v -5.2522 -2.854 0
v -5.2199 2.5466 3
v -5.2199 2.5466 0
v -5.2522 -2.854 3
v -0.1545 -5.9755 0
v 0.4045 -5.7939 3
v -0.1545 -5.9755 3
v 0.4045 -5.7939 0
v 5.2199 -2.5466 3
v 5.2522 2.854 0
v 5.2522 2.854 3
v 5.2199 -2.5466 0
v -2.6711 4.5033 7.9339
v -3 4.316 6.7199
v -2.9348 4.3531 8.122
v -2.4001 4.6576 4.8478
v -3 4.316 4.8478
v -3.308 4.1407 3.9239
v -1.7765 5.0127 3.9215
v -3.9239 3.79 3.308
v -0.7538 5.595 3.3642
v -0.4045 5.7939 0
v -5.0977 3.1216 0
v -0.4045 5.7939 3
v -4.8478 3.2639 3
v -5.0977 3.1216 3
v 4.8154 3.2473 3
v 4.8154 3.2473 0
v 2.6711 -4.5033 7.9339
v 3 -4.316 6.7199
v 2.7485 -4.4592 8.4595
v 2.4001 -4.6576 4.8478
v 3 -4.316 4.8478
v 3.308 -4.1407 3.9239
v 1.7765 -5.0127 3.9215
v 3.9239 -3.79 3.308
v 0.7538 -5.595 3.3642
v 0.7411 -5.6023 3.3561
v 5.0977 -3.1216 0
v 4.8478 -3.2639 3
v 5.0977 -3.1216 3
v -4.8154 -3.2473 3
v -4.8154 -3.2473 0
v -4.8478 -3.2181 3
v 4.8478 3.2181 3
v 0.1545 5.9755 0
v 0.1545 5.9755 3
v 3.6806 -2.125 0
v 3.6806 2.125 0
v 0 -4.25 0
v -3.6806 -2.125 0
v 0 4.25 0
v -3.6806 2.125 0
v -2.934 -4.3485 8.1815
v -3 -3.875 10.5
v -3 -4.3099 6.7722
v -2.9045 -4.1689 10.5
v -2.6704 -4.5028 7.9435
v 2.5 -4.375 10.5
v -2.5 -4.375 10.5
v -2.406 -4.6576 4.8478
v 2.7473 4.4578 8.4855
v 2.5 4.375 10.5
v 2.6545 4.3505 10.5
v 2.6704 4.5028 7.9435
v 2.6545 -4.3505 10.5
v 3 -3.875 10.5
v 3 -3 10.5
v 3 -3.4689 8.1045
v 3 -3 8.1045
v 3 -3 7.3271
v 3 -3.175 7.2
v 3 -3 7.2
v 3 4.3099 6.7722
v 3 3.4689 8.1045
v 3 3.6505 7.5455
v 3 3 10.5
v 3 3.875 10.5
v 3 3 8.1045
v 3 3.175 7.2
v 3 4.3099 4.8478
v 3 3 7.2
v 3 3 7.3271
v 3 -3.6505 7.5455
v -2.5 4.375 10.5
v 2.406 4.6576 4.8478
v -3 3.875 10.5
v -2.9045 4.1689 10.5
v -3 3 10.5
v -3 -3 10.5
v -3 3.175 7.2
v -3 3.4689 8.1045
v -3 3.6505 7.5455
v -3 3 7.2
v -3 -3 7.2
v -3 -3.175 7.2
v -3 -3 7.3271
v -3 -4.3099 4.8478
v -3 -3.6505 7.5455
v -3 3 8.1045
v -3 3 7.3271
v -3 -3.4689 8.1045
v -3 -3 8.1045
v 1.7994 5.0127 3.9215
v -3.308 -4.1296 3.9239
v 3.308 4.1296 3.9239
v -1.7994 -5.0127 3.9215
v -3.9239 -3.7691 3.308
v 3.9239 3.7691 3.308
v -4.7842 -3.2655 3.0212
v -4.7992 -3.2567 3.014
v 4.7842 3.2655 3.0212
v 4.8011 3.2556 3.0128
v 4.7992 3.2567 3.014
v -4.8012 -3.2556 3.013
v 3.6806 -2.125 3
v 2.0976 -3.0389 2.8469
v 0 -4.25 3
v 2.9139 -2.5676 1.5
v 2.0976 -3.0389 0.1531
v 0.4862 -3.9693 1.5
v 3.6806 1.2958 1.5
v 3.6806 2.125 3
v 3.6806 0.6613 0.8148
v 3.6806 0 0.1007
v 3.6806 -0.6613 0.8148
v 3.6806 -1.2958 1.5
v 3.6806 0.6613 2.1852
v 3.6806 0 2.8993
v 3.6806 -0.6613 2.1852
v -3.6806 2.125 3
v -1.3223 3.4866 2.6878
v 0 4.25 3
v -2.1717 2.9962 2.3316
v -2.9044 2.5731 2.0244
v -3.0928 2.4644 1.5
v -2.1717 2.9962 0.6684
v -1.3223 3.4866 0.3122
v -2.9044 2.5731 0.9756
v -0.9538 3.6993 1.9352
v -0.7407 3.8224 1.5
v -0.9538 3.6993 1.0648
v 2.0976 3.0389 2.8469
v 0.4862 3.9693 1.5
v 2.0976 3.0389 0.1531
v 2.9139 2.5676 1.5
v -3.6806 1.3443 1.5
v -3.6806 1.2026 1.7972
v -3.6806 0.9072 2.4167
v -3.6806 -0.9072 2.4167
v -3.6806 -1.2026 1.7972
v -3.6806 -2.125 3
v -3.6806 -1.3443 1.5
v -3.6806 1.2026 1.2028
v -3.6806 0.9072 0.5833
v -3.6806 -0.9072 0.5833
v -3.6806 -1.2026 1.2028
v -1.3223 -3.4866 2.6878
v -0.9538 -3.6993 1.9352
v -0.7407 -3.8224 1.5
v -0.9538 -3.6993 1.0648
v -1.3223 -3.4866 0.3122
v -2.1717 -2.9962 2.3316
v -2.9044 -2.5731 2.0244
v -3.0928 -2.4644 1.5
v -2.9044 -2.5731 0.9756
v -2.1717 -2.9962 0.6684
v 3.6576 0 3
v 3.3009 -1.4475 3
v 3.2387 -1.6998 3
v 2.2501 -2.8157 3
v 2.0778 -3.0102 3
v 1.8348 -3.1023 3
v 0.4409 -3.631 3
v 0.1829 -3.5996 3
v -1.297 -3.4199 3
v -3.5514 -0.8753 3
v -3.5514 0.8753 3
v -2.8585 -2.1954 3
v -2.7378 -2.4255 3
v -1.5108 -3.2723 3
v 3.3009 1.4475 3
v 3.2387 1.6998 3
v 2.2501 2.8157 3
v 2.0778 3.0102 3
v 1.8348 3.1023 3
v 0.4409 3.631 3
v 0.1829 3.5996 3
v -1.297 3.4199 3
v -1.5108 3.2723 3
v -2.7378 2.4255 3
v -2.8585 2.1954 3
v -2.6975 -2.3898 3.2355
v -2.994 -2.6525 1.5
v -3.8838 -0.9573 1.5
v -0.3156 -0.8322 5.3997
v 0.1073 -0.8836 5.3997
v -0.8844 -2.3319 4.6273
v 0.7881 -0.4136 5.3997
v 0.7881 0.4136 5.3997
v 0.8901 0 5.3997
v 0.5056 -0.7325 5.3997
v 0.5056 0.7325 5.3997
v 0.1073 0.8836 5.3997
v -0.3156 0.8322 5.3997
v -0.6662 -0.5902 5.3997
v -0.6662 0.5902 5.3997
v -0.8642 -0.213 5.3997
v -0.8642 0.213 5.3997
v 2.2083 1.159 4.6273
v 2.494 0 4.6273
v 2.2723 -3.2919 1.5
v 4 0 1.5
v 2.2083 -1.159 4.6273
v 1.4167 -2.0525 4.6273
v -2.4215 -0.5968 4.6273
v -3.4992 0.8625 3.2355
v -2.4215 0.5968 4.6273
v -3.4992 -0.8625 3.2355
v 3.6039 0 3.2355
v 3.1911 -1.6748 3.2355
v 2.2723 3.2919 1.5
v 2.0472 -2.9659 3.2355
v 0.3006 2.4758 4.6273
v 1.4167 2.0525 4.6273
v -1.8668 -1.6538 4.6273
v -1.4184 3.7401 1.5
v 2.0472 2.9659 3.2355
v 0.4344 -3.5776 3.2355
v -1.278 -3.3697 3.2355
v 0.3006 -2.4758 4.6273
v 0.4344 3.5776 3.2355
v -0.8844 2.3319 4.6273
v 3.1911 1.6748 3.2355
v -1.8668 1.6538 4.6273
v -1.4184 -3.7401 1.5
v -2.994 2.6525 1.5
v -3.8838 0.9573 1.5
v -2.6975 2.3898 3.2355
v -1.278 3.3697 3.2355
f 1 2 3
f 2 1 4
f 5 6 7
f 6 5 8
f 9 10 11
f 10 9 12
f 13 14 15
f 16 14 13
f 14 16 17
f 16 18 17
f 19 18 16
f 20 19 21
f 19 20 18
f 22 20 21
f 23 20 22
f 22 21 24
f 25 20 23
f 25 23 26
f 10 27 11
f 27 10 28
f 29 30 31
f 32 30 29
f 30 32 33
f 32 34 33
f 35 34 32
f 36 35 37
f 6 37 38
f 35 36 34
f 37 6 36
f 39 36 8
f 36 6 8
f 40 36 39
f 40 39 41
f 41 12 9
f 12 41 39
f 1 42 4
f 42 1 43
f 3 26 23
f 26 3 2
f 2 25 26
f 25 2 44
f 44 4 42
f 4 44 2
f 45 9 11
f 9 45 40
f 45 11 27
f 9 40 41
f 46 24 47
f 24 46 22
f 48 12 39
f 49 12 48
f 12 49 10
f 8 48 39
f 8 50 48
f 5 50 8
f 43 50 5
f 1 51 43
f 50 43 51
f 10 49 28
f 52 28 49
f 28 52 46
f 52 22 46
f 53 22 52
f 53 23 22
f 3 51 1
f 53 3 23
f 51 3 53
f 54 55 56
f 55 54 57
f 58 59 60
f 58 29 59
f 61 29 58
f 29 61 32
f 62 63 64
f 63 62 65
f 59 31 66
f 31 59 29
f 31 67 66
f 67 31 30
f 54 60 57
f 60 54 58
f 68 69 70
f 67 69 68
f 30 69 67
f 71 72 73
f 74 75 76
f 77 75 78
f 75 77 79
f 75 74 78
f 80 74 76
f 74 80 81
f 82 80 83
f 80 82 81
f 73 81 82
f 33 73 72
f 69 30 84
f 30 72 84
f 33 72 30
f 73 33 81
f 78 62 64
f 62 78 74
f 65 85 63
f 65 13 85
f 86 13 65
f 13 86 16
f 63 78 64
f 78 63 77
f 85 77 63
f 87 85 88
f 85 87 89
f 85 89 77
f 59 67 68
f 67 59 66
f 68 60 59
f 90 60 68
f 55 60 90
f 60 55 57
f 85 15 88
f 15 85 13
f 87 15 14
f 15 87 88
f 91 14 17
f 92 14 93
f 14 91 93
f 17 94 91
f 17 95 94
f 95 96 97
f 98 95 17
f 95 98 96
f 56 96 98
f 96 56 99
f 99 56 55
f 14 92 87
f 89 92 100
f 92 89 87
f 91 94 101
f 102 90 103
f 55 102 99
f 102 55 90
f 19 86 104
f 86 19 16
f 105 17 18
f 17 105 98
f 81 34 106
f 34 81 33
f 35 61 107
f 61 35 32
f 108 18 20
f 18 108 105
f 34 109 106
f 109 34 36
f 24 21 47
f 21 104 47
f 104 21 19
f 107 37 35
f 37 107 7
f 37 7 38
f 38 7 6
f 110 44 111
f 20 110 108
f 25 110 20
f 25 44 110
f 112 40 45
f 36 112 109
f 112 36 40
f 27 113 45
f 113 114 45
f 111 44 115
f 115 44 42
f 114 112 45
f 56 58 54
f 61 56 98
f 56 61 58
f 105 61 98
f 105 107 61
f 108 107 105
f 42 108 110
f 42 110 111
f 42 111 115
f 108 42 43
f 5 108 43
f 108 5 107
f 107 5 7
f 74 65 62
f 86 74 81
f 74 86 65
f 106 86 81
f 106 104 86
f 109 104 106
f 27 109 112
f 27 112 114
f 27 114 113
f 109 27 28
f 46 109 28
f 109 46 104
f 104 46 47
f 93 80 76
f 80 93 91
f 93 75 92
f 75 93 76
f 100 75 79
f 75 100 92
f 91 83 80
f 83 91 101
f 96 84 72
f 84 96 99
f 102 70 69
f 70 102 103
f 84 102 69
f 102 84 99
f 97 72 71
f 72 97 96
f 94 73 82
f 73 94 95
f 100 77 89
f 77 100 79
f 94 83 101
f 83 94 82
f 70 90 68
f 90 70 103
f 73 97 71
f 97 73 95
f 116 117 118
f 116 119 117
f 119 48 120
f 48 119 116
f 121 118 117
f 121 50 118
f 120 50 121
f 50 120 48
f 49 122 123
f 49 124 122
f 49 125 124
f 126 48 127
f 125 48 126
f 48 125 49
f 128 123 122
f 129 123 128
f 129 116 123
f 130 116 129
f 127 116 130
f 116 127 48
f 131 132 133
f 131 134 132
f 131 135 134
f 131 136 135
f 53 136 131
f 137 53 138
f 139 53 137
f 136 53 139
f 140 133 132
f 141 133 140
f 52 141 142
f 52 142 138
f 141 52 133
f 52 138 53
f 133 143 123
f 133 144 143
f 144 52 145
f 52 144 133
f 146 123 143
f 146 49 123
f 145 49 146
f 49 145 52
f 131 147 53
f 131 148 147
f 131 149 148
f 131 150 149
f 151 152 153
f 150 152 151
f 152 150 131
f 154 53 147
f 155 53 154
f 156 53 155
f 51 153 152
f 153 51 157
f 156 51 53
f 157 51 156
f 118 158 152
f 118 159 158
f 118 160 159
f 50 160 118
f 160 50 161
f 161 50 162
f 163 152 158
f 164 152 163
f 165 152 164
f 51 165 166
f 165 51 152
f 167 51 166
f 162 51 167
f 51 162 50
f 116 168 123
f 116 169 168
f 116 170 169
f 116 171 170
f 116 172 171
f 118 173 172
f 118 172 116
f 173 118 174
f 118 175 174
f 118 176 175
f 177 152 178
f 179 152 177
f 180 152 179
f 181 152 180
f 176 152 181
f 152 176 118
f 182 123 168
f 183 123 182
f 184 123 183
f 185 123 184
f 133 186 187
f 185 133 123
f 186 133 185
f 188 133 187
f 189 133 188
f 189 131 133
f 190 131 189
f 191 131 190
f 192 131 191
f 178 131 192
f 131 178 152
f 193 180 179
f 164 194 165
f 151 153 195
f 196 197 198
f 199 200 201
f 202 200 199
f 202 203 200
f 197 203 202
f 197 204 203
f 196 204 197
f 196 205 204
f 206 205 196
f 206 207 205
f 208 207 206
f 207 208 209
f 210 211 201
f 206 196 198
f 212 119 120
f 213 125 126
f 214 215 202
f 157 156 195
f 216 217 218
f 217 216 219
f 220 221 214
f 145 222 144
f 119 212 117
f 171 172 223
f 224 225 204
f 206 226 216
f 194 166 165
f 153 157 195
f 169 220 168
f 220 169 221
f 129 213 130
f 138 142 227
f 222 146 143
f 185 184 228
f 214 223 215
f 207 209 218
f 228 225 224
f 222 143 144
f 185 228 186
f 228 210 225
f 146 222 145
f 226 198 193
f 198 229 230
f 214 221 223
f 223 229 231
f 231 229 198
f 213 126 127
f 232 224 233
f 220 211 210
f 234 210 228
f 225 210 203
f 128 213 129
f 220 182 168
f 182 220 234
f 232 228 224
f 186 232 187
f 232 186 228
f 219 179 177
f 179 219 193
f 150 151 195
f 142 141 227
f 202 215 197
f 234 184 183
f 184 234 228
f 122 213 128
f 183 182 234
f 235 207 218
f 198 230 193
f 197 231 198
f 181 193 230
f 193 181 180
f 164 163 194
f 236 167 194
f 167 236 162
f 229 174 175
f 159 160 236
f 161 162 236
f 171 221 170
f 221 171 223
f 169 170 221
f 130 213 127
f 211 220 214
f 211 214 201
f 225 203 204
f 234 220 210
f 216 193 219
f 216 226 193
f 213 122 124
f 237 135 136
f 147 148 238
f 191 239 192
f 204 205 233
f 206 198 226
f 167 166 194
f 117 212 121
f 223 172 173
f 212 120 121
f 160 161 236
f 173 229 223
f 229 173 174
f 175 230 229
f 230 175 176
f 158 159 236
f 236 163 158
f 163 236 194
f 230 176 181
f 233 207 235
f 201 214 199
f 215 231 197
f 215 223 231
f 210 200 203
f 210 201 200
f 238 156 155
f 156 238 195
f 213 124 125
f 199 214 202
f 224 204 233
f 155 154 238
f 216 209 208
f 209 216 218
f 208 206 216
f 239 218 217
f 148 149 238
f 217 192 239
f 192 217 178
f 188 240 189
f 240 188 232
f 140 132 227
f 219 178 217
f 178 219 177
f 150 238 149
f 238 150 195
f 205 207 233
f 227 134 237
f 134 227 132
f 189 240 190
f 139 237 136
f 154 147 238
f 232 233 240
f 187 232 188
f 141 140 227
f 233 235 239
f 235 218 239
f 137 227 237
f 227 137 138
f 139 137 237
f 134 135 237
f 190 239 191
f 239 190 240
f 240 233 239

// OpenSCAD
// file: lib/screw.scad
//////////////////////////////////////////////////////////////////////
// Screws, Bolts, and Nuts.
//////////////////////////////////////////////////////////////////////

function get_metric_bolt_head_size(size) = lookup(size, [
		[ 4.0,  7.0],
		[ 5.0,  8.0],
		[ 6.0, 10.0],
		[ 7.0, 11.0],
		[ 8.0, 13.0],
		[10.0, 16.0],
		[12.0, 18.0],
		[14.0, 21.0],
		[16.0, 24.0],
		[18.0, 27.0],
		[20.0, 30.0]
	]);


function get_metric_nut_size(size) = lookup(size, [
		[ 2.0,  4.0],
		[ 2.5,  5.0],
		[ 3.0,  5.5],
		[ 4.0,  7.0],
		[ 5.0,  8.0],
		[ 6.0, 10.0],
		[ 7.0, 11.0],
		[ 8.0, 13.0],
		[10.0, 17.0],
		[12.0, 19.0],
		[14.0, 22.0],
		[16.0, 24.0],
		[18.0, 27.0],
		[20.0, 30.0],
	]);


function get_metric_nut_thickness(size) = lookup(size, [
		[ 2.0,  1.6],
		[ 2.5,  2.0],
		[ 3.0,  2.4],
		[ 4.0,  3.2],
		[ 5.0,  4.0],
		[ 6.0,  5.0],
		[ 7.0,  5.5],
		[ 8.0,  6.5],
		[10.0,  8.0],
		[12.0, 10.0],
		[14.0, 11.0],
		[16.0, 13.0],
		[18.0, 15.0],
		[20.0, 16.0]
	]);


function get_metric_corehole_size(size) = lookup(size, [
		[ 2.0,  1.60],
		[ 2.5,  2.05],
		[ 3.0,  2.50],
		[ 4.0,  3.30],
		[ 5.0,  4.20],
		[ 6.0,  5.00],
		[ 8.0,  6.80],
		[10.0,  8.50],
		[12.0, 10.20],
		[16.0, 14.00],
		[20.0, 17.50]
	]);

// Makes a simple threadless screw, useful for making screwholes.
//   screwsize = diameter of threaded part of screw.
//   screwlen = length of threaded part of screw.
//   headsize = diameter of the screw head.
//   headlen = length of the screw head.
// Example:
//   screw(screwsize=3,screwlen=10,headsize=6,headlen=3);
module screw(screwsize=3,screwlen=10,headsize=6,headlen=3,$fn=undef,tolerance=0)
{
	$fn = ($fn==undef)?max(8,floor(180/asin(2/screwsize)/2)*2):$fn;
	translate([0,0,-(screwlen)/2])
		cylinder(r=screwsize/2+tolerance/2, h=screwlen+0.05, center=true, $fn=$fn);
	translate([0,0,(headlen)/2])
		cylinder(r=headsize/2+tolerance/2, h=headlen, center=true, $fn=$fn*2);
}


// Makes an unthreaded model of a standard nut for a standard metric screw.
//   size = standard metric screw size in mm. (Default: 3)
//   hole = include an unthreaded hole in the nut.  (Default: true)
// Example:
//   metric_nut(size=8, hole=true);
//   metric_nut(size=3, hole=false);
module metric_nut(size=3, hole=true, $fn=undef, center=false, play=0, hPlay=0)
{
	$fn = ($fn==undef)?max(8,floor(180/asin(2/size)/2)*2):$fn;
	radius = get_metric_nut_size(size)/2/cos(30);
	thick = get_metric_nut_thickness(size);
	offset = (center == true)? 0 : (thick+hPlay)/2;
	translate([0,0,offset]) difference() {
		cylinder(r=radius+play, h=thick+hPlay, center=true, $fn=6);
		if (hole == true)
			cylinder(r=size/2, h=thick+hPlay+0.5, center=true, $fn=$fn);
	}
}

module m3Screw(screwlen=10,headsize=6,headlen=3,$fn=undef) {
	screw(3, screwlen,headsize,headlen,$fn);
}

module m3Nut(hole=true, $fn=undef, center=false, play=0, hPlay = 0) {
	metric_nut(3, hole, $fn, center, play=play,hPlay=hPlay);
}
// main file
use <./lib/bcad.scad>
use <./lib/screw.scad>

//$fn=50;
simpleZProbe();

module microSwitch() {
    color("silver")
    move(z=2/2)
        cube([6,6,2],center=true);
    color("black")
    move(z=1)
        cylinder(d=3.5,h=5-1);
    //Connect leads
    yflip_copy()
    xflip_copy()
    move(x=6/2,y=6/2-2,z=-2)
        cube([0.2,1,4]);
}

//copy from https://www.thingiverse.com/thing:1729523
module simpleZProbe(
    wall = 1.5,
    hexSize = 8,
    clearance = 0.35
) {
    %move(z=7.5) microSwitch();

    difference() {
        intersection() {
            fillet(r=2)
            {
                hull() {
                    zring(n=6)
                    move(y=hexSize/2+wall)
                        cylinder(d=1,h=3);
                }
                hull() {
                    move(z=1/2+2)
                        cube([6,hexSize+wall,1],center=true);
                    move(z=10.5/2)
                        rrect([6,hexSize+wall/2,10.5],center=true,r=0.5);
                }
            }
            
            hull() {
                zring(n=6)
                move(y=hexSize/2+wall)
                    cylinder(d=1,h=12);
            }
        }
     
        //Microswitch cut
        move(z=10/2+7.2) {
            cube([10,6,10],center=true);        
            yflip_copy()
            move(y=(6+clearance)/2,z=-10/2+1/2)
            yrot(90)
                cylinder(d=1,h=10,center=true);
        }        
        
        //Nut cut
        move(z=-1)
            zrot(30) cylinder(d=hexSize+.5,h=3+1,$fn=6);
        move(z=1.5)
            sphere(d=hexSize);
    }   
}



//Based on src=http://www.thingiverse.com/thing:225188
//thumbWheel(size=3);
module thumbWheel(
    size = 3,  //Metric nut size 
    r=12,      //Radius of wheel
    rWall=0.5,  //Platic between nut and wall
    clear=0.1,
    grip=30,
    grip_gap=1.8,
    grip_depth=0.6,
    grip_angle=55
) {
    module GripPatter() {
        for (angle=[-grip_angle,grip_angle]) {
            hull(){
                rotate([angle,0,0]) 
                    cube([grip_depth*2,0.1,h*2],center=true);
                rotate([angle,0,0]) 
                    translate([1,0,0]) 
                        cube([1,grip_gap,h*2],center=true);
            }
        }
    }
    
    h = get_metric_nut_thickness(size) + rWall + clear;
    
    difference() {
        cylinder(d=r*2,h=h);
        move(z=-1) {
            metric_nut(size=size, hole=false, play=clear*2,hPlay=1+clear);
            cylinder(d=size+clear*2,h=h+2);
        }
        for (i=[0:grip])
            rotate([0,0,360/grip*i]) 
            translate([r+0.5-grip_depth,0,h/2]) 
                GripPatter();
    }   
}


module sandpaperHolder(d=9,h=60) {
    difference() {
        cylinder(d=d,h=h);
        #move(y=-(1.5/2), z=-1)
            cube([10,1.5,h+2]);
    }
}

//If you have to cut a screw in the right length
//viceJaws to protect the threads
module viceJaw(lX=25,lY=20,w=4,h=20,d=3) {
    difference() {
        union() {
            cube([w,lY,h]);
            cube([lX,w,h]);
        }
        move(x=lX/2,y=-d/6, z=-1)
            cylinder(d=d,h=h+2,$fn=4);
    }
    
}

module messuhr() { //dial gauge
    color("silver") {
        move(y=53/2+20,z=15/2)
        xrot(90)
            cylinder(d=8,h=20);
        cylinder(d=53,h=15);
        move(z=15)
            cylinder(d=58,h=8);
    }
}
